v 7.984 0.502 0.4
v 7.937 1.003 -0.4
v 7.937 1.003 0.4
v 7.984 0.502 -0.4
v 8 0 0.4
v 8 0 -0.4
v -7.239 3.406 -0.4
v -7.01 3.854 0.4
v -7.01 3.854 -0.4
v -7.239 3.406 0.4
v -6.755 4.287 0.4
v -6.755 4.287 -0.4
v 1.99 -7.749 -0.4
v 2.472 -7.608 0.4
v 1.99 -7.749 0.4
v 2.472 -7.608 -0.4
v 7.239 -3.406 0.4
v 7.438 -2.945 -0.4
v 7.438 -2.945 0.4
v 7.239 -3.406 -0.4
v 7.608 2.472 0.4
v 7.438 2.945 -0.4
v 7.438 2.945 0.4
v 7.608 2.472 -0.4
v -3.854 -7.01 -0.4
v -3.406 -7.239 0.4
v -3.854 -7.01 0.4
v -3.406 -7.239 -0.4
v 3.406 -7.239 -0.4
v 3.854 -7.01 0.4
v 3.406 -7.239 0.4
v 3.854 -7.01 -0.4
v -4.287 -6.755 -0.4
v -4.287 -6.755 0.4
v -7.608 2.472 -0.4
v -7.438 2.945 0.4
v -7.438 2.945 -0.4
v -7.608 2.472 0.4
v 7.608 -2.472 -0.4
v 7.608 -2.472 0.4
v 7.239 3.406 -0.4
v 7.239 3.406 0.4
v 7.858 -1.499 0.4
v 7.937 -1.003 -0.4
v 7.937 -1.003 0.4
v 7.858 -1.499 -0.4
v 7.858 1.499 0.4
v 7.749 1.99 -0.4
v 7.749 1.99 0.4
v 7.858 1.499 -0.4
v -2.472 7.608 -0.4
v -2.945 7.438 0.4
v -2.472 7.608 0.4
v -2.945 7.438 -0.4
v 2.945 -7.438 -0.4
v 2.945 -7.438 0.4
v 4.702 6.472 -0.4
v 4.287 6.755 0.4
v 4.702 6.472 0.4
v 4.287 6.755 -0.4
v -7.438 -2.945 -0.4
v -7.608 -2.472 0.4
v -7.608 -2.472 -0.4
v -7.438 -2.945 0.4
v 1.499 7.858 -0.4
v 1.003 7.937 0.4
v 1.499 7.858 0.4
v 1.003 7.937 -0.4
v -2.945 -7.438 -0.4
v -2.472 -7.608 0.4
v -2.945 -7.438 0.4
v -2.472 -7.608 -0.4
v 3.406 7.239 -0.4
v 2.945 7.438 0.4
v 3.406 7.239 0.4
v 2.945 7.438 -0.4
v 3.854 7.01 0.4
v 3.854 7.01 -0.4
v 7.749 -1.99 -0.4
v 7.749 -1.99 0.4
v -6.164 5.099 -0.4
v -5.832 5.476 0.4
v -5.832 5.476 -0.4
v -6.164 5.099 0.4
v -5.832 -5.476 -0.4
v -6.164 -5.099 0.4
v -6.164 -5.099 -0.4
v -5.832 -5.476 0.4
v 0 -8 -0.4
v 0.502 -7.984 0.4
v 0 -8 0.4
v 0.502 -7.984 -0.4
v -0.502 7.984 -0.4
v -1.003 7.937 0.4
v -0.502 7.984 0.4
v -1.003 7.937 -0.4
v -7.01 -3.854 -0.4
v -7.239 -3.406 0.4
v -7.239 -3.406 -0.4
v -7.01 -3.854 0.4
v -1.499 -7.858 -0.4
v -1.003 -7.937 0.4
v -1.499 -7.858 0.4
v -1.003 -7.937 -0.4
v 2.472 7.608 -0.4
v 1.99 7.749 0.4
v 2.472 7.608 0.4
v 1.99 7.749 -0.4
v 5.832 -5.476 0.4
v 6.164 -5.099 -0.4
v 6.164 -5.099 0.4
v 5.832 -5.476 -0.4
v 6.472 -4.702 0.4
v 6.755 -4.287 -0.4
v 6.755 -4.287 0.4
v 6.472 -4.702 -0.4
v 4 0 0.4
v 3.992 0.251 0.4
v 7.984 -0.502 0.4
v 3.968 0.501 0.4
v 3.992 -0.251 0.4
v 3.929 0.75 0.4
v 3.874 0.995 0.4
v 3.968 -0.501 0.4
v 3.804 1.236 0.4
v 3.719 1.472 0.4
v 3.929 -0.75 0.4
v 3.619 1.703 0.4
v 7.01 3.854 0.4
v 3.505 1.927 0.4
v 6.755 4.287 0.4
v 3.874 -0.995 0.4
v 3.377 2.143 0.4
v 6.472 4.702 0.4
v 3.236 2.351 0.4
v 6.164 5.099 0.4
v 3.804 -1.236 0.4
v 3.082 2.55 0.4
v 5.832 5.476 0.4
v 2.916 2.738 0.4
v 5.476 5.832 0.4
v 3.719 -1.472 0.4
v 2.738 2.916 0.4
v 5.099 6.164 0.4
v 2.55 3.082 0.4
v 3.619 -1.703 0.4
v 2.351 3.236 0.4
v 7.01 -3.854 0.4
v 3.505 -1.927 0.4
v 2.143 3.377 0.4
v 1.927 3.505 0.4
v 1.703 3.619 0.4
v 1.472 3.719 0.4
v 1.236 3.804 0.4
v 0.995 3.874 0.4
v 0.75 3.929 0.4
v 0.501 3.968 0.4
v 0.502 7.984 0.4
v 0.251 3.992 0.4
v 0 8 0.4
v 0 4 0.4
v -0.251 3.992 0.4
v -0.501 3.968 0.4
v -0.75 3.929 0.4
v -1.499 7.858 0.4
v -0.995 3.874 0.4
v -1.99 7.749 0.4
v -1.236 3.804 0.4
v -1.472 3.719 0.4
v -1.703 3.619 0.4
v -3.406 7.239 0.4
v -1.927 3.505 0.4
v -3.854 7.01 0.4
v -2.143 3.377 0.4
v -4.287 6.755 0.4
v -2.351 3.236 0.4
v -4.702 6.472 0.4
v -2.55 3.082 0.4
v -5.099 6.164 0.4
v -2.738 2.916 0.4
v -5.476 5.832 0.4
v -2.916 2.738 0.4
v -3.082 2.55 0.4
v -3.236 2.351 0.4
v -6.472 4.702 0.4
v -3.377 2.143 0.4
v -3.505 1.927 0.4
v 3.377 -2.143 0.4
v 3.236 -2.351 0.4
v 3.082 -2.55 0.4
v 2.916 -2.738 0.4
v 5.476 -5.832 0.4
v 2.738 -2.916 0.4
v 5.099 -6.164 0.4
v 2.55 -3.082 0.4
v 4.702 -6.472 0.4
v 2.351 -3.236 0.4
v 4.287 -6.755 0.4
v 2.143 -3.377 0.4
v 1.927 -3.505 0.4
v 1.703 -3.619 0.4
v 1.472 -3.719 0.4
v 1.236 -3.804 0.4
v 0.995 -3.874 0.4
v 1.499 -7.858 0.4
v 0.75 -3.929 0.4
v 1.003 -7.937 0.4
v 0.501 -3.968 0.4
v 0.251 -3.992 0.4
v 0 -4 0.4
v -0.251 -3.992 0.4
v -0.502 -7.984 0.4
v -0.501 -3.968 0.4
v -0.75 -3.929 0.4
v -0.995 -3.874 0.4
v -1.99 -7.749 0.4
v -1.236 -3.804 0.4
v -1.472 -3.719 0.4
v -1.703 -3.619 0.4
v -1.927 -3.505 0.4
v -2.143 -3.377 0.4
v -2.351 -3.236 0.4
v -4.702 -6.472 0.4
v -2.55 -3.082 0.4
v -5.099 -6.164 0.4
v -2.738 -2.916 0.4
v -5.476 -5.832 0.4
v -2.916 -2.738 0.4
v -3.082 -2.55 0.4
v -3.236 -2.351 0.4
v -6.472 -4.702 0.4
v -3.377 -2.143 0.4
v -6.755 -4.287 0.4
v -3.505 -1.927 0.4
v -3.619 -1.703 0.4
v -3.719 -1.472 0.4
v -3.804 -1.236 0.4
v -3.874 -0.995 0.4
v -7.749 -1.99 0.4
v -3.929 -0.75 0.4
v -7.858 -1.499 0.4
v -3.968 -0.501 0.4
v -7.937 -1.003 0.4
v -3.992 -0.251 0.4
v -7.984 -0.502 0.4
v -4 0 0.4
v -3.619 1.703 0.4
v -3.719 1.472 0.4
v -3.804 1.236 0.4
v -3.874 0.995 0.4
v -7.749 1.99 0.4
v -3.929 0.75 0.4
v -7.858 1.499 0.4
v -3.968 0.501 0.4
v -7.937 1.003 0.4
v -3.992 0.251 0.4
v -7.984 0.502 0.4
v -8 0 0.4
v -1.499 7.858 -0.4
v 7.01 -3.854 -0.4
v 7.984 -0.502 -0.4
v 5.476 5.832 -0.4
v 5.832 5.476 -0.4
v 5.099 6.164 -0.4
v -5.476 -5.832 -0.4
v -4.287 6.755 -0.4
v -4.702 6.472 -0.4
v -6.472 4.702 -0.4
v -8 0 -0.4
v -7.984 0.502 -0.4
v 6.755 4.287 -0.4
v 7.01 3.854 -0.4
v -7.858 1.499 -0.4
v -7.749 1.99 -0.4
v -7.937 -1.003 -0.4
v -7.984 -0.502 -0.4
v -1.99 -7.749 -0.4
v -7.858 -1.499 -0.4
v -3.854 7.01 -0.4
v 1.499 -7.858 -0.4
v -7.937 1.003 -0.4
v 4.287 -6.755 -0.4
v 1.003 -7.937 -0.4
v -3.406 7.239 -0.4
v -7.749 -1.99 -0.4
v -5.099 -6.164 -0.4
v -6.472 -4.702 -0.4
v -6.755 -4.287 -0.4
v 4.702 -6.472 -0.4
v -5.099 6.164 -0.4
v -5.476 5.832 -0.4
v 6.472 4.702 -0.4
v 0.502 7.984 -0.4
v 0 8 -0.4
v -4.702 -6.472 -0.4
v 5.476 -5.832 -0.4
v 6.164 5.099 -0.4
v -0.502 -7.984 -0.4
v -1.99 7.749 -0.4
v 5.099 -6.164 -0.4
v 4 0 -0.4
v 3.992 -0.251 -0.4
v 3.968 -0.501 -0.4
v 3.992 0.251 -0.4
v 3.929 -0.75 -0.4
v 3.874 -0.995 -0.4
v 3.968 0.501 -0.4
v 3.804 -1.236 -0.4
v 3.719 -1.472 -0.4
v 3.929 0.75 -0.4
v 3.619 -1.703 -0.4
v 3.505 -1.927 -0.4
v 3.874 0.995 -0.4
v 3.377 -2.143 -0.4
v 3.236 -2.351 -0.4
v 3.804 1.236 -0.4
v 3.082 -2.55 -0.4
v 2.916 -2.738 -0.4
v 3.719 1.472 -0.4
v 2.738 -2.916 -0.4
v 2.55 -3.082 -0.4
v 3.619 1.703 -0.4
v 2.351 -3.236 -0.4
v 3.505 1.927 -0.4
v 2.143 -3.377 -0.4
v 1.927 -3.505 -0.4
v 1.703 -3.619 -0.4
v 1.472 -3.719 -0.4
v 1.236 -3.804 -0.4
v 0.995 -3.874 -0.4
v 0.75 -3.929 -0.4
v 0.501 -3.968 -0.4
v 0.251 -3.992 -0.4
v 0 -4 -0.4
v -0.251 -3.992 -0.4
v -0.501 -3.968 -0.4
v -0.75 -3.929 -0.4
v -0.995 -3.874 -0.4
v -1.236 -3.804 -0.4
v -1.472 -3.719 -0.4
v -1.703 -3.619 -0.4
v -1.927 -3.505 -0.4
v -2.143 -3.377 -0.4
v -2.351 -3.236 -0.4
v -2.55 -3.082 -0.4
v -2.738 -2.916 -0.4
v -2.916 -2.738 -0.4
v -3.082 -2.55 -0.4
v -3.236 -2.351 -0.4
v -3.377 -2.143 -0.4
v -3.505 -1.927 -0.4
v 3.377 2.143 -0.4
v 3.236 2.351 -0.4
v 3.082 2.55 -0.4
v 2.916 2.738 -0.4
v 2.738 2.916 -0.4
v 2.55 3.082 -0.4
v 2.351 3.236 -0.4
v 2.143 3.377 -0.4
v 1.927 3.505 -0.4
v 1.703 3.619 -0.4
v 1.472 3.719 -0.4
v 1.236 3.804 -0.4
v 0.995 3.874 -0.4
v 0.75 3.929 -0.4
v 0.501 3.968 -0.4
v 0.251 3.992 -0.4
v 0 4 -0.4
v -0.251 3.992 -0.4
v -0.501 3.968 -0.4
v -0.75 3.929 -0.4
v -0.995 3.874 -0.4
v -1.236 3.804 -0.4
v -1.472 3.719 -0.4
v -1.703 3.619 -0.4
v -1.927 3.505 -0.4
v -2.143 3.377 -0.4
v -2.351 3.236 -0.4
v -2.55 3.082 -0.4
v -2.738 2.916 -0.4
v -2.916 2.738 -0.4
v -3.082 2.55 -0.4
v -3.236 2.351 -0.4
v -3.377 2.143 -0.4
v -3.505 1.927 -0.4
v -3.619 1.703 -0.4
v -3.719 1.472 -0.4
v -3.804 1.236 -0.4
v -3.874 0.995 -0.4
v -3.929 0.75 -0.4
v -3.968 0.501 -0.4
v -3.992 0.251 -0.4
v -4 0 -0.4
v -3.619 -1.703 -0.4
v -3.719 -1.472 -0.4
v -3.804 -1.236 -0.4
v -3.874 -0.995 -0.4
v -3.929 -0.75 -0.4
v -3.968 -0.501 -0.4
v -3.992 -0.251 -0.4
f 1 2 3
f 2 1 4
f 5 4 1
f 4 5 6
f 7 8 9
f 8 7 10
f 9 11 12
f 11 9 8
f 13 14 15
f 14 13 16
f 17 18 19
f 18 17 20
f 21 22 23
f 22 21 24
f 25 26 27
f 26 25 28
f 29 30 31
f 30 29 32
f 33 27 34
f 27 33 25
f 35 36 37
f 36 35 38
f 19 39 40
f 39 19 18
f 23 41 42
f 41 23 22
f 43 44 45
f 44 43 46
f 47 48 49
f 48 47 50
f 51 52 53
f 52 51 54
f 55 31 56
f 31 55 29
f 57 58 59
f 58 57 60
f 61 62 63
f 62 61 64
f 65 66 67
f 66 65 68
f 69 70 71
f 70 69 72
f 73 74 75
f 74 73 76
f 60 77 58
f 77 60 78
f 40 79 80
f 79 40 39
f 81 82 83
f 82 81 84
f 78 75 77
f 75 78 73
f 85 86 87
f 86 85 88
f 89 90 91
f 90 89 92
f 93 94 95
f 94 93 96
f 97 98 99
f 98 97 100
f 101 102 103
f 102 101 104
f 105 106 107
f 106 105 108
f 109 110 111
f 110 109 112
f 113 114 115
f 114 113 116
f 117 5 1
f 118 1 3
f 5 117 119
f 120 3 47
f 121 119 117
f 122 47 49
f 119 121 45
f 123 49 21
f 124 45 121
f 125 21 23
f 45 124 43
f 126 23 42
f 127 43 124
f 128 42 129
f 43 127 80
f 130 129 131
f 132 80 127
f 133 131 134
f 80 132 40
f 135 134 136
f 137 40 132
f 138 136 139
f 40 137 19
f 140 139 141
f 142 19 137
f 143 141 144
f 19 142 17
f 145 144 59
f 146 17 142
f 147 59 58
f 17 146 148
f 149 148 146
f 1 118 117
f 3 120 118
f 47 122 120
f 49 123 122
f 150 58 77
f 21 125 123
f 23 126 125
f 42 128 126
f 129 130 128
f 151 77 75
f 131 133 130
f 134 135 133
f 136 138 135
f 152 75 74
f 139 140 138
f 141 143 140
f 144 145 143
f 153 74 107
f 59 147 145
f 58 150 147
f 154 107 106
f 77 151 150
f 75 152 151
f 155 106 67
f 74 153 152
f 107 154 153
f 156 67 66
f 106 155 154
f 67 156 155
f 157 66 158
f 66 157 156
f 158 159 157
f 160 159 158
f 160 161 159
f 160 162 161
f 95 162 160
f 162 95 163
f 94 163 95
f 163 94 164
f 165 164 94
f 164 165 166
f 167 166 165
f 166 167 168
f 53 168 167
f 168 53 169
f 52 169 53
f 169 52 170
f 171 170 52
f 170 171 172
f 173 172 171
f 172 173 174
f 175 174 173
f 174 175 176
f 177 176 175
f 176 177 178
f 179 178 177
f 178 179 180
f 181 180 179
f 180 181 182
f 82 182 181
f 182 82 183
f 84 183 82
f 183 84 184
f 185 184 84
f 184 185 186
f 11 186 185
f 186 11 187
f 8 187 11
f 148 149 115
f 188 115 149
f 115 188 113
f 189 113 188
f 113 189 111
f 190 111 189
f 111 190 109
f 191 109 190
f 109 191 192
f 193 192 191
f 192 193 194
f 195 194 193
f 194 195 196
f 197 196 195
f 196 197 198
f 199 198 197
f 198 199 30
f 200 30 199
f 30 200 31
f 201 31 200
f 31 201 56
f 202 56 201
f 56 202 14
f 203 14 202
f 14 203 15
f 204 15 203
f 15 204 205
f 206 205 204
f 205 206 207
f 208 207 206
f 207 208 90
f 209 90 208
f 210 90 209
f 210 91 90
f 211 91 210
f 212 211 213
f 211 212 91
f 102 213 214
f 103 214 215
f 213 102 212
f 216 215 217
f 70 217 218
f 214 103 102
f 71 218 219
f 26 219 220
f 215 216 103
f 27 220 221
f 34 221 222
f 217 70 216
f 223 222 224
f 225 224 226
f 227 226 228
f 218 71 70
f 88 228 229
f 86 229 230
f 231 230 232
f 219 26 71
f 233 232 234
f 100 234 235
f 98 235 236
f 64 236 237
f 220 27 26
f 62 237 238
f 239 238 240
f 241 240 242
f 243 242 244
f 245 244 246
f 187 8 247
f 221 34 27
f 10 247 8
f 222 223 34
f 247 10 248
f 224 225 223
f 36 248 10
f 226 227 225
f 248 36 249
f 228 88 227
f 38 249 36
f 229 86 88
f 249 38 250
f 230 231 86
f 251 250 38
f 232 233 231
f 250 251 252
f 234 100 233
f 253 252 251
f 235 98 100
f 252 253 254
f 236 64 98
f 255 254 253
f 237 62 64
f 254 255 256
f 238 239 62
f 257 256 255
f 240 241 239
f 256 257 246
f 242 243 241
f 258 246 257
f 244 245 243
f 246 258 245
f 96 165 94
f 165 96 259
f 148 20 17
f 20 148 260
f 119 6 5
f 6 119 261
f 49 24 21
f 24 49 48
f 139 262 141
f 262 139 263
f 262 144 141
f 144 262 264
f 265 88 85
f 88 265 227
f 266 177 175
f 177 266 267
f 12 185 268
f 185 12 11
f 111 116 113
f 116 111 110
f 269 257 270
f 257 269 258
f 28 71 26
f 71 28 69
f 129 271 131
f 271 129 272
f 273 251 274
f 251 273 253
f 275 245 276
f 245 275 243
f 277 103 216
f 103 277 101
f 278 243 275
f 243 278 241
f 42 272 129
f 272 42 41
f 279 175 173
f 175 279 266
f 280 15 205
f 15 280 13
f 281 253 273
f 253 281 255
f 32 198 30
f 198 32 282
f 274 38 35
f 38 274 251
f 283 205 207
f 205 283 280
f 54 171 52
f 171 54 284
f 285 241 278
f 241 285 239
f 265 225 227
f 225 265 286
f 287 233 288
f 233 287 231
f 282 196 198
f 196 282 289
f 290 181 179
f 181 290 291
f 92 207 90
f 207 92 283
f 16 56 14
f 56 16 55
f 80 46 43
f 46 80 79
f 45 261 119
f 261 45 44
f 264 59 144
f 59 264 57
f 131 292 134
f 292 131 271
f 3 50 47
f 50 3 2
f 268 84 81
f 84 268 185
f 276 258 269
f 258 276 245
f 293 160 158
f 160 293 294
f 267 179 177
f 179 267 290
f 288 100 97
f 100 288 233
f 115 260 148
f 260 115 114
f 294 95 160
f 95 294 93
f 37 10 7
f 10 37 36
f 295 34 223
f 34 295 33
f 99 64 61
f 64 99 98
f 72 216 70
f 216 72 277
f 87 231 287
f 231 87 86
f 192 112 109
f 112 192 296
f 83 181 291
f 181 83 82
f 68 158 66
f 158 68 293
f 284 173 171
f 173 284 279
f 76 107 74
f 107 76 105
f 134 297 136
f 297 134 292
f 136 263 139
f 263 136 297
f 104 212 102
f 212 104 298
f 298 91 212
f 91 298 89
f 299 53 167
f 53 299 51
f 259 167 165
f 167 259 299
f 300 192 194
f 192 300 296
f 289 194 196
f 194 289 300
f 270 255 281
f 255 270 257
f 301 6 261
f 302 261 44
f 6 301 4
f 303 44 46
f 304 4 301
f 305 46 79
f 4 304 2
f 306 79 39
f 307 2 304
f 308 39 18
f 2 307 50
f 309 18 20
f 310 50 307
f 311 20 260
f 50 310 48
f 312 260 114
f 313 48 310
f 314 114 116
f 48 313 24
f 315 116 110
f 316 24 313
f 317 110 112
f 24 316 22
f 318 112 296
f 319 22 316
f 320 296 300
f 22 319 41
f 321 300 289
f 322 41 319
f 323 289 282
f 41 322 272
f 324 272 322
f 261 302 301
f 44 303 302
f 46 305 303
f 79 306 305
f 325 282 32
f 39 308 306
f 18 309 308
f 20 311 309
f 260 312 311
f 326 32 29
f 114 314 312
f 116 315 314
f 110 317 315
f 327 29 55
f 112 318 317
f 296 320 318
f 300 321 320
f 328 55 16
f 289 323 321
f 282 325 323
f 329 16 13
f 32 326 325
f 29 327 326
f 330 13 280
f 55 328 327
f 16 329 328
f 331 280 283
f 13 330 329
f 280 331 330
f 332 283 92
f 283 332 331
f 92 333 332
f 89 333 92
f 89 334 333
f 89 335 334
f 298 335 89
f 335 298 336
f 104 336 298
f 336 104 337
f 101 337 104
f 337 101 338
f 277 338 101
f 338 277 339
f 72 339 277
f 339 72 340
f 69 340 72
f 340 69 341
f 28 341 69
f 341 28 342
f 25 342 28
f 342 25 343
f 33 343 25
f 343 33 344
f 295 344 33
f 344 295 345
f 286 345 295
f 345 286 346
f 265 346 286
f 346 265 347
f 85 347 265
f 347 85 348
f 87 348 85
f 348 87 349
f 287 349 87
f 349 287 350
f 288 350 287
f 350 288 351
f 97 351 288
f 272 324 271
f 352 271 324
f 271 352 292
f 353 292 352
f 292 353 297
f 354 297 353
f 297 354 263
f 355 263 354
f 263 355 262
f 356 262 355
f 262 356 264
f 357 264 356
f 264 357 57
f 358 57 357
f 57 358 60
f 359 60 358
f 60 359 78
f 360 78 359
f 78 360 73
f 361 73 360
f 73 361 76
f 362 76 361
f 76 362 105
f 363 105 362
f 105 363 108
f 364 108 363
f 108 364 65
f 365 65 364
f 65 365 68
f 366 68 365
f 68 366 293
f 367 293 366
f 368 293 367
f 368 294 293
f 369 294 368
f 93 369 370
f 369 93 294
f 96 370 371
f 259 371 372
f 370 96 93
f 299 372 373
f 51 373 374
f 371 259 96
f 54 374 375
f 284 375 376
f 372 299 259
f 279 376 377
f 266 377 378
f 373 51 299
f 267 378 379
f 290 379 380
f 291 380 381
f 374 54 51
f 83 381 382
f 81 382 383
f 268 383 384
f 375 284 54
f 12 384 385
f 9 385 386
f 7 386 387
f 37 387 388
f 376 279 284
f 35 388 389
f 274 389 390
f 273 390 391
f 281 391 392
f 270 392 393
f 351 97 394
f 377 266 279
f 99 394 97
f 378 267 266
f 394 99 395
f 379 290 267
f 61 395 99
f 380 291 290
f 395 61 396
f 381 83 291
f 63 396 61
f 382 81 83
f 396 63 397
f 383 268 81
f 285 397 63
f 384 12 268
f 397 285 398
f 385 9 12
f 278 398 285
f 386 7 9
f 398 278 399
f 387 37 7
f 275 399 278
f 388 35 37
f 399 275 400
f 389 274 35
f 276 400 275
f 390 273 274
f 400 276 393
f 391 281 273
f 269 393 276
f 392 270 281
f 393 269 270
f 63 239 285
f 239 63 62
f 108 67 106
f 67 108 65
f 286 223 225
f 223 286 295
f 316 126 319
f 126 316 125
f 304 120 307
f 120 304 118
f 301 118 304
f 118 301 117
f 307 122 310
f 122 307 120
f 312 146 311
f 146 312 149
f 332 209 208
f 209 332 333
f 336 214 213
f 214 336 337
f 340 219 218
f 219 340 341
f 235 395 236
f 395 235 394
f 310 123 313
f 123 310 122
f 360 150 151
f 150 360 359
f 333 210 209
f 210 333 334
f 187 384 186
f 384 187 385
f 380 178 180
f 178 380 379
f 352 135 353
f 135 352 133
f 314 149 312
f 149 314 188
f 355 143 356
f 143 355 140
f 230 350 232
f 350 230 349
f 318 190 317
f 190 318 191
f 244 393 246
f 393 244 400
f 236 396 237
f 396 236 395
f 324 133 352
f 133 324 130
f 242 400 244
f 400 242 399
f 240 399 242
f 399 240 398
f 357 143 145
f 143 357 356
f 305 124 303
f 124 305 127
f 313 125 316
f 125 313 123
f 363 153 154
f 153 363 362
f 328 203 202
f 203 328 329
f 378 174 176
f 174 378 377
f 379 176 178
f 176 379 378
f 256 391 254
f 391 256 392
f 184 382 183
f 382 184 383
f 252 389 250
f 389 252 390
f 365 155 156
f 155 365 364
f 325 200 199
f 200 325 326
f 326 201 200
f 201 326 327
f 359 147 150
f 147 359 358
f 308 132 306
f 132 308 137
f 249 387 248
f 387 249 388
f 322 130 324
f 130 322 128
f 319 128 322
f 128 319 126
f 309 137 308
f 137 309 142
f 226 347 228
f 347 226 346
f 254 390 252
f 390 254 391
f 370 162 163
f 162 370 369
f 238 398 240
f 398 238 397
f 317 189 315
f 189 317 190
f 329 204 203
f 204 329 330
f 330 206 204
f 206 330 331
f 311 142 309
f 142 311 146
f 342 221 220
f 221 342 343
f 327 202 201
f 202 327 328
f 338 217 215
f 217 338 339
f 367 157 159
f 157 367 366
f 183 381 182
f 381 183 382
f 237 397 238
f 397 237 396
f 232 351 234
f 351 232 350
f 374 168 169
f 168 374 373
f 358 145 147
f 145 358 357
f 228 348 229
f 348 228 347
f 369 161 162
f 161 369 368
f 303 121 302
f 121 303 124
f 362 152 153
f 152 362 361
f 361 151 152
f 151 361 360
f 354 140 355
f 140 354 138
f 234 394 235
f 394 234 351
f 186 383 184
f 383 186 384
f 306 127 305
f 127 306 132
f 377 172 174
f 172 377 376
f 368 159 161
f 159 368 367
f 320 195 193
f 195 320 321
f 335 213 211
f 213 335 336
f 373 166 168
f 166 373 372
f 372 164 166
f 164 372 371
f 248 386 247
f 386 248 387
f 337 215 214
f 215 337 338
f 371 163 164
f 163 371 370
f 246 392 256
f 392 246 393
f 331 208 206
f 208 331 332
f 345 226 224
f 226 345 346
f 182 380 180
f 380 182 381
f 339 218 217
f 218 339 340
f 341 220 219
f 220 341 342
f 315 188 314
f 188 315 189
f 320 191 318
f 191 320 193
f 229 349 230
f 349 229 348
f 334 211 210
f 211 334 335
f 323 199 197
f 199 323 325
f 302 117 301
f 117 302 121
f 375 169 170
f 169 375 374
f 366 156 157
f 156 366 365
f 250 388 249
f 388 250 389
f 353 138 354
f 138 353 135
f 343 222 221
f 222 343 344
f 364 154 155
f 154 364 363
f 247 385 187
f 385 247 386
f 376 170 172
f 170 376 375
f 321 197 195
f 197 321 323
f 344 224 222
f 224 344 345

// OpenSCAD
difference(){
    cylinder(0.8, 8, 8, center=true, $fn=100);

    cylinder(1.5, 4, 4, center=true, $fn=100);
}
